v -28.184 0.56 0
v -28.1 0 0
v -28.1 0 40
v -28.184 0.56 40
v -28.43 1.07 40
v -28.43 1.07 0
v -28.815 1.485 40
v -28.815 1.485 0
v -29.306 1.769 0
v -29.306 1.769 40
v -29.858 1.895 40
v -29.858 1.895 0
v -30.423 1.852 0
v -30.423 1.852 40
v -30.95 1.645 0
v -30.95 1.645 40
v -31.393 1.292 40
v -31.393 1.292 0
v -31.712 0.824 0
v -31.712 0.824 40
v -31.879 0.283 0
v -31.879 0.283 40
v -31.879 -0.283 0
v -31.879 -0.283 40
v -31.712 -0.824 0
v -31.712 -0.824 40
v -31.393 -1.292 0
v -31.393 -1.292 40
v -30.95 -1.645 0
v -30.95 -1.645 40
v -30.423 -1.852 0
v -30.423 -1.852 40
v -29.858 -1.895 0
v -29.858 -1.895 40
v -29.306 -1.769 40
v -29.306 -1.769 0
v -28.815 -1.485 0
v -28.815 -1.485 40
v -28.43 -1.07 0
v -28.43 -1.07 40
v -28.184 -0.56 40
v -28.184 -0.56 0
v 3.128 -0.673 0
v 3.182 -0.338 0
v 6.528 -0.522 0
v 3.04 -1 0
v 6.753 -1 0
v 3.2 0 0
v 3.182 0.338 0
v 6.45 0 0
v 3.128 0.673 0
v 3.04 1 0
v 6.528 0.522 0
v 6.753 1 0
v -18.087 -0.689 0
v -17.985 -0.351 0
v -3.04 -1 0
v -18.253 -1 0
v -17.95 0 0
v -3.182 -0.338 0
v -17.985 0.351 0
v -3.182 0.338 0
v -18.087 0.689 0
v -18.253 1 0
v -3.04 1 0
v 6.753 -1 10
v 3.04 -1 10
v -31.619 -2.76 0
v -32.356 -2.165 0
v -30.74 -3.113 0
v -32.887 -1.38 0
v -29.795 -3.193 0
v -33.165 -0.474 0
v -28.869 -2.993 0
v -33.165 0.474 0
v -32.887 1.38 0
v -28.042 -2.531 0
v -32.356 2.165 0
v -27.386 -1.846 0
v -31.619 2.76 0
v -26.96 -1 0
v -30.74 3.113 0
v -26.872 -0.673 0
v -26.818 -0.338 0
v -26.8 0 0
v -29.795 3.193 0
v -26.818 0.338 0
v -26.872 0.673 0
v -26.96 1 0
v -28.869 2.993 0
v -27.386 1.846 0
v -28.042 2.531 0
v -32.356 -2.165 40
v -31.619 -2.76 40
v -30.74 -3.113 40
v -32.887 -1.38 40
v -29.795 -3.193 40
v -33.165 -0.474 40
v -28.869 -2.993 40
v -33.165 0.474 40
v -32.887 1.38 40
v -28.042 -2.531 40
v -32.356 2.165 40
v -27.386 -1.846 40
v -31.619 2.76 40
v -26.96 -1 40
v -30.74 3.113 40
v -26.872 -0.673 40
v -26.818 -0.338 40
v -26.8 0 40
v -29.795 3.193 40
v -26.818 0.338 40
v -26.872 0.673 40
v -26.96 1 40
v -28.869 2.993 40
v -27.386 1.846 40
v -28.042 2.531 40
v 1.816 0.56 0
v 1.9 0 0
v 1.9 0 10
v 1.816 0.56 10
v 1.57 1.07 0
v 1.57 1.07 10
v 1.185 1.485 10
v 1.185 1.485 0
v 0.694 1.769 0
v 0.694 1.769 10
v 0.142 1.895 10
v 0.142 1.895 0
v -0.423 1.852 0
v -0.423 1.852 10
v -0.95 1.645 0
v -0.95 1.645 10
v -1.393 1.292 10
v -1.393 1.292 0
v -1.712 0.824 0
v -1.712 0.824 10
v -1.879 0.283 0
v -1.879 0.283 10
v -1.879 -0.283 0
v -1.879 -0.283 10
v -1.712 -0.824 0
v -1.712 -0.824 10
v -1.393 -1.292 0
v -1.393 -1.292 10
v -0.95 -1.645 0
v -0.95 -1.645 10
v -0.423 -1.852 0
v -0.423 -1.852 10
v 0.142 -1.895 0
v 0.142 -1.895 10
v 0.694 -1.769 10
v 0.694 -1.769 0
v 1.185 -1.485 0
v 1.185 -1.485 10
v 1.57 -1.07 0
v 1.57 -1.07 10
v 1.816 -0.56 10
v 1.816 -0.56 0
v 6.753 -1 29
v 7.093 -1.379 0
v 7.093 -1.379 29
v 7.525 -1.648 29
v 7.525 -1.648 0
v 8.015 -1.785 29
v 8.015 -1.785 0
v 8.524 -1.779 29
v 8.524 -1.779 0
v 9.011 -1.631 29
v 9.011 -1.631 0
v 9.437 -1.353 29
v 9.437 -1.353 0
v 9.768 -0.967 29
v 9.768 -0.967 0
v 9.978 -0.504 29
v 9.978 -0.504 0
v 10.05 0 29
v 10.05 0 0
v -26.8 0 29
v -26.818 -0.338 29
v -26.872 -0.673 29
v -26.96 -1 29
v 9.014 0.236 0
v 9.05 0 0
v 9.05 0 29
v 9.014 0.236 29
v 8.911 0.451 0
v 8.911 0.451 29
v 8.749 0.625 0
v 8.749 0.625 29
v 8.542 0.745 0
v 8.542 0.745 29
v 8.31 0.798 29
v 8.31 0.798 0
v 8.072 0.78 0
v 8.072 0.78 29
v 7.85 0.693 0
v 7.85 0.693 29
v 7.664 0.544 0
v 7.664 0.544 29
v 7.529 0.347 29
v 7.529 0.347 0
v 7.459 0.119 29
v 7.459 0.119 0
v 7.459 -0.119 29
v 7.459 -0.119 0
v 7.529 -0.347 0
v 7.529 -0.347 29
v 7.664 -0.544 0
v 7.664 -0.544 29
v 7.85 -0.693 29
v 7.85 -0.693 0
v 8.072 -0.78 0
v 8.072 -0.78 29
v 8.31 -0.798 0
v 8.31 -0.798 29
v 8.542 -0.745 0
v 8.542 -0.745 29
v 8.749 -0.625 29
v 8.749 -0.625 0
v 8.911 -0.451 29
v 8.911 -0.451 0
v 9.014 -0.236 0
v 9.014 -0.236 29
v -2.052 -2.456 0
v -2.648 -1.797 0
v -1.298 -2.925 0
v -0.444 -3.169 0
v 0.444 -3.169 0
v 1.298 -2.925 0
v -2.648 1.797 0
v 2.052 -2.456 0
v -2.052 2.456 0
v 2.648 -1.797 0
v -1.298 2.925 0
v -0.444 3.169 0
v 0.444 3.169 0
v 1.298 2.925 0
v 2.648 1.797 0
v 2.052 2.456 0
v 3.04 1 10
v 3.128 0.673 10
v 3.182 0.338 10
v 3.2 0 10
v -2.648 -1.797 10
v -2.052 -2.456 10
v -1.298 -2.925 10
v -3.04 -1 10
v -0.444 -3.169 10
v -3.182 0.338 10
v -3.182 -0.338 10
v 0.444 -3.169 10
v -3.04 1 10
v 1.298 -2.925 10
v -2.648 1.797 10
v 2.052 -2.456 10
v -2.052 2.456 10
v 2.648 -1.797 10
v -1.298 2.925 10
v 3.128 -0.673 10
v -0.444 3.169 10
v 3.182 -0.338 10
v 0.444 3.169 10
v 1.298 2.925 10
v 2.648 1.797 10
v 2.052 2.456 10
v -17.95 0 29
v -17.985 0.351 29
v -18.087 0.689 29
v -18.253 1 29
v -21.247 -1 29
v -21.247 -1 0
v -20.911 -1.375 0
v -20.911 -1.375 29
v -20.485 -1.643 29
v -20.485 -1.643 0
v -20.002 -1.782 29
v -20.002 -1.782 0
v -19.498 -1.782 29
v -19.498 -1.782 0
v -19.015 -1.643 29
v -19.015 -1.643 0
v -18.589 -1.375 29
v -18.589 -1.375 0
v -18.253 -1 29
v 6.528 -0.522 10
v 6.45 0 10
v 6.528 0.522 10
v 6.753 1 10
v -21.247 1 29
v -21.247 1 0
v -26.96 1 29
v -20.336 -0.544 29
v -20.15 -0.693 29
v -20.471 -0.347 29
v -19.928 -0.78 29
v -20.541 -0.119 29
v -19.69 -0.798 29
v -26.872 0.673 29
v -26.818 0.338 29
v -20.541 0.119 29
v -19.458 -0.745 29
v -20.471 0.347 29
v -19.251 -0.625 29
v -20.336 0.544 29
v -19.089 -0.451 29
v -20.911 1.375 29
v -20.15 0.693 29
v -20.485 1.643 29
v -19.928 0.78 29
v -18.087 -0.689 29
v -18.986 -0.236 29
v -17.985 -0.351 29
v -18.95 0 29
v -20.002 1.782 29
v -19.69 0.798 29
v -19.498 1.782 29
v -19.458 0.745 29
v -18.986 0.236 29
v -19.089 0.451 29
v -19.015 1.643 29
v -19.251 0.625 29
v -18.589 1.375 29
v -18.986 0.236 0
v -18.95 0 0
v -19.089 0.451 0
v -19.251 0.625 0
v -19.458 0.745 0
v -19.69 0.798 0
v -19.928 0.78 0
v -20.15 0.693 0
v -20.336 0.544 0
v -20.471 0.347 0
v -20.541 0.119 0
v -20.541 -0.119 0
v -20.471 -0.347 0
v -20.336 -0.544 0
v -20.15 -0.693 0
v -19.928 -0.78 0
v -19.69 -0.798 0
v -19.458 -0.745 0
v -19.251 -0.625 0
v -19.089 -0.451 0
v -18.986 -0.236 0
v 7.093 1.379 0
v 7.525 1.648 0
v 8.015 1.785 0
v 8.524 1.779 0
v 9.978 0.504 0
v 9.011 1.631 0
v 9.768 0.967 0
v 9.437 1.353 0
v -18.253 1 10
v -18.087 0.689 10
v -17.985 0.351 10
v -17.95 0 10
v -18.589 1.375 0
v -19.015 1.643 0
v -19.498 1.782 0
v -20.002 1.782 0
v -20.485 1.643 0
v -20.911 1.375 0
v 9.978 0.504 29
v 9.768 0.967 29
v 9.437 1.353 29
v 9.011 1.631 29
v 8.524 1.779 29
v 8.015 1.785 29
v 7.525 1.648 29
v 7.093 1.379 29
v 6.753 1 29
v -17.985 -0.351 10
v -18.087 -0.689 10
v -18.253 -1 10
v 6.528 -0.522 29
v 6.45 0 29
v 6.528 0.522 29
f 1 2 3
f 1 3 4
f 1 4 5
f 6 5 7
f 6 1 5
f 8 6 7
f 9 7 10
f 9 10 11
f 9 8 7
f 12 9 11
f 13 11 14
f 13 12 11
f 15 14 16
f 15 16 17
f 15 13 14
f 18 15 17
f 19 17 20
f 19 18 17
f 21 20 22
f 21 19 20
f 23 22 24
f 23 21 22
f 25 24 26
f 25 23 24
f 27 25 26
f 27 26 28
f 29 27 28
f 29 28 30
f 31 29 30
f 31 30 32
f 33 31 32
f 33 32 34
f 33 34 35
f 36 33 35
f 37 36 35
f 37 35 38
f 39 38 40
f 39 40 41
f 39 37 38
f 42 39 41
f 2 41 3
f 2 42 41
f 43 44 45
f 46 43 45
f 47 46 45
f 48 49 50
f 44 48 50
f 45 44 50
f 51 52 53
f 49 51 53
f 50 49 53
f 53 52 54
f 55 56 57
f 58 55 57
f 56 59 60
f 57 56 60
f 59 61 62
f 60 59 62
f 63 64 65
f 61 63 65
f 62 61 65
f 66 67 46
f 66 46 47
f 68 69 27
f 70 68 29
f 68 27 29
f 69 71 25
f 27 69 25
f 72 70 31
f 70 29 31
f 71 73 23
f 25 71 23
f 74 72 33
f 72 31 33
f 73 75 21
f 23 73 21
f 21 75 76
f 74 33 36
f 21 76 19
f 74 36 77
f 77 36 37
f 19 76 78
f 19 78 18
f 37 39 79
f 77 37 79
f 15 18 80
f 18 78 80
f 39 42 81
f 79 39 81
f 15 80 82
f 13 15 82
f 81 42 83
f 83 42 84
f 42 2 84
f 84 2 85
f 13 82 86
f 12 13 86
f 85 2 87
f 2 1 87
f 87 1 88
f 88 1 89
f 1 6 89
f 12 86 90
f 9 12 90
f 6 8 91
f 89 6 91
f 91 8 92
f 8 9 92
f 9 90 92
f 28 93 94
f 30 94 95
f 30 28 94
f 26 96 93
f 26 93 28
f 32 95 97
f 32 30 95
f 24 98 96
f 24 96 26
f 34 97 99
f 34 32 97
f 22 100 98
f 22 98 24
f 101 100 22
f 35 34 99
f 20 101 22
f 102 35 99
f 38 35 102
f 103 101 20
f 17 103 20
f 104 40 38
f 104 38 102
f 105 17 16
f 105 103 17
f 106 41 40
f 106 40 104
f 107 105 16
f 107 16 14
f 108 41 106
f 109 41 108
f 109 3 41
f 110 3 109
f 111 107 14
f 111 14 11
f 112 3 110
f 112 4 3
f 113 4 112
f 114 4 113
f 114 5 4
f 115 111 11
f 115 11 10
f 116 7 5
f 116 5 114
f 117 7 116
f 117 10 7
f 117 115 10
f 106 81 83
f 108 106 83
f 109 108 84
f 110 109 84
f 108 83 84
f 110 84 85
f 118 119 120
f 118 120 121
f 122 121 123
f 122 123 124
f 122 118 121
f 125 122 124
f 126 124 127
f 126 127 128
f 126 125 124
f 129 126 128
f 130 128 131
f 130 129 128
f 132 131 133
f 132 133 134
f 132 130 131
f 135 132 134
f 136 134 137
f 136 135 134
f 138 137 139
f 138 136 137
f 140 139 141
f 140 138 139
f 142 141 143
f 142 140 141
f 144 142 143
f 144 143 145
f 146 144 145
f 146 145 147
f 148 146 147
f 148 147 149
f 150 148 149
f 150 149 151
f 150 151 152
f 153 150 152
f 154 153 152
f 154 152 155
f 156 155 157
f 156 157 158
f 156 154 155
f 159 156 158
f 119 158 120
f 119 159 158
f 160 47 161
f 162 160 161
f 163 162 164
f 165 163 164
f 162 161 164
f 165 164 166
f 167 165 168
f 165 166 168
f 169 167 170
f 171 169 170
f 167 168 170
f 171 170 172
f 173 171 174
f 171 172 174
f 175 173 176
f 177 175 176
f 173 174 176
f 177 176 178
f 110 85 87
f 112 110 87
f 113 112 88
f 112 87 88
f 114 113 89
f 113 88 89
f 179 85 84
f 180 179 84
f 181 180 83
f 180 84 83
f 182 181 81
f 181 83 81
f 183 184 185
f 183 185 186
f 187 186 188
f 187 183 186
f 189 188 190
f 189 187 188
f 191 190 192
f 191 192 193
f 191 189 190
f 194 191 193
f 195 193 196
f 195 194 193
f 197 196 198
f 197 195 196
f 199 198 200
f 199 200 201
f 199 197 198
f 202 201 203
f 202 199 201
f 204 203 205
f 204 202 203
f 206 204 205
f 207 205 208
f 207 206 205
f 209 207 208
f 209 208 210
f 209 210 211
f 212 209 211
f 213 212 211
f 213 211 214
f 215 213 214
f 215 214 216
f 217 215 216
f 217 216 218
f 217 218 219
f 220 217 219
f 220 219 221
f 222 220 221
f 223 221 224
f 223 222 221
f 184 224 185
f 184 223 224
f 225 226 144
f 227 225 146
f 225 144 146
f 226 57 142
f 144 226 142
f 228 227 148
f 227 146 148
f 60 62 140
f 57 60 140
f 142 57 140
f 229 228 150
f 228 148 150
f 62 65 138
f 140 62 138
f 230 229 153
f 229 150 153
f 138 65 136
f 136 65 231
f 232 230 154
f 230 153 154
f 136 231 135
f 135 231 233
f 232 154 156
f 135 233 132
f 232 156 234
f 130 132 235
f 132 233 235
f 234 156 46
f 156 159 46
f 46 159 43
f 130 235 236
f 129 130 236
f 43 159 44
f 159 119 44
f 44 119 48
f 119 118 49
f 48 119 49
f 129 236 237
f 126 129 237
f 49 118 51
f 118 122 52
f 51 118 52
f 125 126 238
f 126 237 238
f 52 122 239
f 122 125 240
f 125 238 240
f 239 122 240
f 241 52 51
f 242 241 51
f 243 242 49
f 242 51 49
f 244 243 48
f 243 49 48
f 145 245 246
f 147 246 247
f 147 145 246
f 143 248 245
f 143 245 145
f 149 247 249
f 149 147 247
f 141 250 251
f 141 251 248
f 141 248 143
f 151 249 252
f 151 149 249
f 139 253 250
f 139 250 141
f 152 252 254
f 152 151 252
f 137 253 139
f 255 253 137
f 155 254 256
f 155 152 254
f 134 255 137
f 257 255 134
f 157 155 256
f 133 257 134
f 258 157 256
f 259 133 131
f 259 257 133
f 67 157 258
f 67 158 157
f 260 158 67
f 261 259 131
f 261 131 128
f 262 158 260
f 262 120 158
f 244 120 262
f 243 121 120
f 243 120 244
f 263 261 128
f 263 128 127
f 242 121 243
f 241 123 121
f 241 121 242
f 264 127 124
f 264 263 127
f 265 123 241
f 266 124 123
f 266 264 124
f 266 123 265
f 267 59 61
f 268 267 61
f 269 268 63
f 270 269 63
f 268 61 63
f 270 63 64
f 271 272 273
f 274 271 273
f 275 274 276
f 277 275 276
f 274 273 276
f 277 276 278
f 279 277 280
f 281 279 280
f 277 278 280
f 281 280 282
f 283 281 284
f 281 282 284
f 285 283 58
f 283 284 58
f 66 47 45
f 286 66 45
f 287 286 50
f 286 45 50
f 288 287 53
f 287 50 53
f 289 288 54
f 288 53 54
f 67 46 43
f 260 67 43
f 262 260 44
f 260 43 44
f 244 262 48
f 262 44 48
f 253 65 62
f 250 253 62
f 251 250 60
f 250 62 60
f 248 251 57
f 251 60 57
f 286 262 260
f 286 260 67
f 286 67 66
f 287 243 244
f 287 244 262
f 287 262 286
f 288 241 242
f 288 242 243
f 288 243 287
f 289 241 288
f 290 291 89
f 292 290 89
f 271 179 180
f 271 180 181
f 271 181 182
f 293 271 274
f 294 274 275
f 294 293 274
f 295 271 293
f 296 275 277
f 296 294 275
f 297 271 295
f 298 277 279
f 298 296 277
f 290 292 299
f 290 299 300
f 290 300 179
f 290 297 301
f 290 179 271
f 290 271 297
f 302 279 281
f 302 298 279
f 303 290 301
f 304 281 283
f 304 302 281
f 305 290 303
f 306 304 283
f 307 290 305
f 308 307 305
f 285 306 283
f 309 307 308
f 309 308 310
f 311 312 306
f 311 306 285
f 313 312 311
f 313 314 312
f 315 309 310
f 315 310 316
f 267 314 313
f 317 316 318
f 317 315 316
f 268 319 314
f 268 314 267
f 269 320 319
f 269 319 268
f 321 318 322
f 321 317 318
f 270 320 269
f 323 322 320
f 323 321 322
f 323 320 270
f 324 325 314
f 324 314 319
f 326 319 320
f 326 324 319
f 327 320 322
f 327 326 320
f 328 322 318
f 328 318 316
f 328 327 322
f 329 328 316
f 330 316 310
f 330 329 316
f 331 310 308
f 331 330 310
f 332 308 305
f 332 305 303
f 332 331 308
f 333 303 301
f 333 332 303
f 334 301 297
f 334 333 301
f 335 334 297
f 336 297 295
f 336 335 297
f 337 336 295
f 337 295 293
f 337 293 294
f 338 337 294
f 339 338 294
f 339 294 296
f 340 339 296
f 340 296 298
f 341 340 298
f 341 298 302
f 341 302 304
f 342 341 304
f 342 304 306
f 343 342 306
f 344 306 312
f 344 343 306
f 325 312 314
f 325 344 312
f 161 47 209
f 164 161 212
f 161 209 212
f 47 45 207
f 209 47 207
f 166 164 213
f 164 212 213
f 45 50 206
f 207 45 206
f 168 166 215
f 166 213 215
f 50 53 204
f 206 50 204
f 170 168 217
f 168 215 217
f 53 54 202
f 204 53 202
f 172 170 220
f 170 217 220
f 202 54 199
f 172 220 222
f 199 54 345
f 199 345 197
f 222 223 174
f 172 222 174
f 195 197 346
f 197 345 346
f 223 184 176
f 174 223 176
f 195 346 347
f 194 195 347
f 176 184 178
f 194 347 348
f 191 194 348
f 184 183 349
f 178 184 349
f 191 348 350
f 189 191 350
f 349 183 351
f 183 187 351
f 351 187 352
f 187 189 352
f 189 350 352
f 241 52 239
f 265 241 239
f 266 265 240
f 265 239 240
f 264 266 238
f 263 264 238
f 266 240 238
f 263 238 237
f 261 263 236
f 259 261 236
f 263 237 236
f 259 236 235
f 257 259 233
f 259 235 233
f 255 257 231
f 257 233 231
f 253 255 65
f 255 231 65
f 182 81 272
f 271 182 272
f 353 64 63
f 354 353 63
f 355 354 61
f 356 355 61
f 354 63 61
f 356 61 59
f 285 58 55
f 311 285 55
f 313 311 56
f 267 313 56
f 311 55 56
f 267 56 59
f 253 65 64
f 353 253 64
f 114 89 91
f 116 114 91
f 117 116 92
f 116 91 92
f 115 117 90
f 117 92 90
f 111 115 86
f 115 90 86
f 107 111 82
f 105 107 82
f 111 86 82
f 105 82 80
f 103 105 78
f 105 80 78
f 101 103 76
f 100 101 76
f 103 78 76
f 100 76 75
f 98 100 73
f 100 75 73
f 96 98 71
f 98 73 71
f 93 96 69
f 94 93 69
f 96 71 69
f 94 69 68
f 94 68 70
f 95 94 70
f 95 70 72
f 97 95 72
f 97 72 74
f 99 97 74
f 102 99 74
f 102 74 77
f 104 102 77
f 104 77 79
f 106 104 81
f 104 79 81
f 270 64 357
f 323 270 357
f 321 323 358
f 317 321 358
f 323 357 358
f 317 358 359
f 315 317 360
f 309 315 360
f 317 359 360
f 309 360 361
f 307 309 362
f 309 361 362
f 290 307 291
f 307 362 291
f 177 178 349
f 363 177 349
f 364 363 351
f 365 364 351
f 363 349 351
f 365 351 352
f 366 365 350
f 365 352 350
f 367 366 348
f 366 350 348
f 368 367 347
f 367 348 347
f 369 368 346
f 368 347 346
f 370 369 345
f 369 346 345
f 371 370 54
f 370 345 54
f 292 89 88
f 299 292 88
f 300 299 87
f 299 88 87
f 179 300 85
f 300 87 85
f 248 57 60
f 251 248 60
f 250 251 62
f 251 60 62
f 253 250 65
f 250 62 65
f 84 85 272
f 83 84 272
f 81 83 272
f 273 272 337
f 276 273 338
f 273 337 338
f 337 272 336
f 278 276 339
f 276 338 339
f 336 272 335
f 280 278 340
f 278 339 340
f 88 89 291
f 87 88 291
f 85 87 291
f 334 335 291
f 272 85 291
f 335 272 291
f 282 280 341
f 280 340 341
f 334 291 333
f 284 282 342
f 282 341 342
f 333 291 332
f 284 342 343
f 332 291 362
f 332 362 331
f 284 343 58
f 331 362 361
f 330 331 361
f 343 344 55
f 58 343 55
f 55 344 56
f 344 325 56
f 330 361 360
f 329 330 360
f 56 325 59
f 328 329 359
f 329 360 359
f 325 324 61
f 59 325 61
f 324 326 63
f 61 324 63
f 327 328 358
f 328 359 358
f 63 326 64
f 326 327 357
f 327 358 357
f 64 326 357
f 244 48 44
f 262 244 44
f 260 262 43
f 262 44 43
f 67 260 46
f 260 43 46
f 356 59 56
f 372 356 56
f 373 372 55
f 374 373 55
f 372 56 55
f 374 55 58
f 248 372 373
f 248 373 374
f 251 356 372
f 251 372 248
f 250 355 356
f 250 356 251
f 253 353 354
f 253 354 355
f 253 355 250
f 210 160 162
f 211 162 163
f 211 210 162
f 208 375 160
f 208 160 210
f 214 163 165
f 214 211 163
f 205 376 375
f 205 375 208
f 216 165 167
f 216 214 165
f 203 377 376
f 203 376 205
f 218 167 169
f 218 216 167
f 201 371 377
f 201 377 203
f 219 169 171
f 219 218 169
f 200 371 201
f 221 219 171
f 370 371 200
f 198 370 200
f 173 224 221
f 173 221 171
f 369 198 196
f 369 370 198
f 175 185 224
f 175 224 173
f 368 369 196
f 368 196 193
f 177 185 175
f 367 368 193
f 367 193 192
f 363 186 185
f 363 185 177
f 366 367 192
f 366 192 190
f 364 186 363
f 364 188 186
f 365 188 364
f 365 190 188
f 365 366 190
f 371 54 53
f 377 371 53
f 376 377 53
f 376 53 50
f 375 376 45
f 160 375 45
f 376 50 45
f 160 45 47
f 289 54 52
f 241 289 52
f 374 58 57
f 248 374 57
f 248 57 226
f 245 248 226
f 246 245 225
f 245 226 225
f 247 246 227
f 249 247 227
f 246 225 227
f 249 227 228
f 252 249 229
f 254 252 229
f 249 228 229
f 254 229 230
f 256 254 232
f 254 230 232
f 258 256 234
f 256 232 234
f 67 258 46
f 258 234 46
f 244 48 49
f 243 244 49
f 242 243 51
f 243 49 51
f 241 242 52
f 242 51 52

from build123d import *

# Parameters (mm, degrees)
F0_R     = 1.9
F1_DEPTH = 40
F2_DEPTH = 10
F0_R_2   = 0.8
F3_DEPTH = 29
F4_DEPTH = 10


with BuildPart() as f1:
    # F0 (on Top) → F1 (new body)
    with BuildSketch(Plane.XY):
        with BuildLine():
            ThreePointArc((-26.960263, -1), (-26.84032, -0.50638), (-26.8, 0))
            ThreePointArc((-26.8, 0), (-26.84032, 0.50638), (-26.960263, 1))
            ThreePointArc((-26.960263, 1), (-33.2, 0), (-26.960263, -1))
        make_face()
        with Locations((-30, 0)):
            Circle(F0_R, mode=Mode.SUBTRACT)
    extrude(amount=F1_DEPTH)


with BuildPart() as f2:
    # F0 (on Top) → F2 (new body)
    with BuildSketch(Plane.XY):
        with BuildLine():
            ThreePointArc((3.039737, 1), (0, 3.2), (-3.039737, 1))
            ThreePointArc((-3.039737, 1), (-3.2, 0), (-3.039737, -1))
            ThreePointArc((-3.039737, -1), (0, -3.2), (3.039737, -1))
            ThreePointArc((3.039737, -1), (3.15968, -0.50638), (3.2, 0))
            ThreePointArc((3.2, 0), (3.15968, 0.50638), (3.039737, 1))
        make_face()
        Circle(F0_R, mode=Mode.SUBTRACT)
    extrude(amount=F2_DEPTH)


with BuildPart() as f3:
    # F0 (on Top) → F3 (new body)
    with BuildSketch(Plane.XY):
        with BuildLine():
            ThreePointArc((-18.253337, 1), (-19.75, 1.8), (-21.246663, 1))
            ThreePointArc((-21.246663, 1), (-21.55, 0), (-21.246663, -1))
            ThreePointArc((-21.246663, -1), (-19.75, -1.8), (-18.253337, -1))
            ThreePointArc((-18.253337, -1), (-18.027503, -0.522497), (-17.95, 0))
            ThreePointArc((-17.95, 0), (-18.027503, 0.522497), (-18.253337, 1))
        make_face()
        with Locations((-19.75, 0)):
            Circle(F0_R_2, mode=Mode.SUBTRACT)
        with BuildLine():
            ThreePointArc((10.05, 0), (8.772497, 1.722497), (6.753337, 1))
            ThreePointArc((6.753337, 1), (6.45, 0), (6.753337, -1))
            ThreePointArc((6.753337, -1), (8.772497, -1.722497), (10.05, 0))
        make_face()
        with Locations((8.25, 0)):
            Circle(F0_R_2, mode=Mode.SUBTRACT)
        with BuildLine():
            ThreePointArc((-26.960263, 1), (-26.84032, 0.50638), (-26.8, 0))
            ThreePointArc((-26.8, 0), (-26.84032, -0.50638), (-26.960263, -1))
            Line((-26.960263, -1), (-21.246663, -1))
            ThreePointArc((-21.246663, -1), (-21.55, 0), (-21.246663, 1))
            Line((-21.246663, 1), (-26.960263, 1))
        make_face()
    extrude(amount=F3_DEPTH)


with BuildPart() as f4:
    # F0 (on Top) → F4 (new body)
    with BuildSketch(Plane.XY):
        with BuildLine():
            Line((-3.039737, 1), (-18.253337, 1))
            ThreePointArc((-18.253337, 1), (-18.027503, 0.522497), (-17.95, 0))
            ThreePointArc((-17.95, 0), (-18.027503, -0.522497), (-18.253337, -1))
            Line((-18.253337, -1), (-3.039737, -1))
            ThreePointArc((-3.039737, -1), (-3.2, 0), (-3.039737, 1))
        make_face()
        with BuildLine():
            Line((6.753337, 1), (3.039737, 1))
            ThreePointArc((3.039737, 1), (3.15968, 0.50638), (3.2, 0))
            ThreePointArc((3.2, 0), (3.15968, -0.50638), (3.039737, -1))
            Line((3.039737, -1), (6.753337, -1))
            ThreePointArc((6.753337, -1), (6.45, 0), (6.753337, 1))
        make_face()
    extrude(amount=F4_DEPTH)


solid = Compound([f1.part, f2.part, f3.part, f4.part])
